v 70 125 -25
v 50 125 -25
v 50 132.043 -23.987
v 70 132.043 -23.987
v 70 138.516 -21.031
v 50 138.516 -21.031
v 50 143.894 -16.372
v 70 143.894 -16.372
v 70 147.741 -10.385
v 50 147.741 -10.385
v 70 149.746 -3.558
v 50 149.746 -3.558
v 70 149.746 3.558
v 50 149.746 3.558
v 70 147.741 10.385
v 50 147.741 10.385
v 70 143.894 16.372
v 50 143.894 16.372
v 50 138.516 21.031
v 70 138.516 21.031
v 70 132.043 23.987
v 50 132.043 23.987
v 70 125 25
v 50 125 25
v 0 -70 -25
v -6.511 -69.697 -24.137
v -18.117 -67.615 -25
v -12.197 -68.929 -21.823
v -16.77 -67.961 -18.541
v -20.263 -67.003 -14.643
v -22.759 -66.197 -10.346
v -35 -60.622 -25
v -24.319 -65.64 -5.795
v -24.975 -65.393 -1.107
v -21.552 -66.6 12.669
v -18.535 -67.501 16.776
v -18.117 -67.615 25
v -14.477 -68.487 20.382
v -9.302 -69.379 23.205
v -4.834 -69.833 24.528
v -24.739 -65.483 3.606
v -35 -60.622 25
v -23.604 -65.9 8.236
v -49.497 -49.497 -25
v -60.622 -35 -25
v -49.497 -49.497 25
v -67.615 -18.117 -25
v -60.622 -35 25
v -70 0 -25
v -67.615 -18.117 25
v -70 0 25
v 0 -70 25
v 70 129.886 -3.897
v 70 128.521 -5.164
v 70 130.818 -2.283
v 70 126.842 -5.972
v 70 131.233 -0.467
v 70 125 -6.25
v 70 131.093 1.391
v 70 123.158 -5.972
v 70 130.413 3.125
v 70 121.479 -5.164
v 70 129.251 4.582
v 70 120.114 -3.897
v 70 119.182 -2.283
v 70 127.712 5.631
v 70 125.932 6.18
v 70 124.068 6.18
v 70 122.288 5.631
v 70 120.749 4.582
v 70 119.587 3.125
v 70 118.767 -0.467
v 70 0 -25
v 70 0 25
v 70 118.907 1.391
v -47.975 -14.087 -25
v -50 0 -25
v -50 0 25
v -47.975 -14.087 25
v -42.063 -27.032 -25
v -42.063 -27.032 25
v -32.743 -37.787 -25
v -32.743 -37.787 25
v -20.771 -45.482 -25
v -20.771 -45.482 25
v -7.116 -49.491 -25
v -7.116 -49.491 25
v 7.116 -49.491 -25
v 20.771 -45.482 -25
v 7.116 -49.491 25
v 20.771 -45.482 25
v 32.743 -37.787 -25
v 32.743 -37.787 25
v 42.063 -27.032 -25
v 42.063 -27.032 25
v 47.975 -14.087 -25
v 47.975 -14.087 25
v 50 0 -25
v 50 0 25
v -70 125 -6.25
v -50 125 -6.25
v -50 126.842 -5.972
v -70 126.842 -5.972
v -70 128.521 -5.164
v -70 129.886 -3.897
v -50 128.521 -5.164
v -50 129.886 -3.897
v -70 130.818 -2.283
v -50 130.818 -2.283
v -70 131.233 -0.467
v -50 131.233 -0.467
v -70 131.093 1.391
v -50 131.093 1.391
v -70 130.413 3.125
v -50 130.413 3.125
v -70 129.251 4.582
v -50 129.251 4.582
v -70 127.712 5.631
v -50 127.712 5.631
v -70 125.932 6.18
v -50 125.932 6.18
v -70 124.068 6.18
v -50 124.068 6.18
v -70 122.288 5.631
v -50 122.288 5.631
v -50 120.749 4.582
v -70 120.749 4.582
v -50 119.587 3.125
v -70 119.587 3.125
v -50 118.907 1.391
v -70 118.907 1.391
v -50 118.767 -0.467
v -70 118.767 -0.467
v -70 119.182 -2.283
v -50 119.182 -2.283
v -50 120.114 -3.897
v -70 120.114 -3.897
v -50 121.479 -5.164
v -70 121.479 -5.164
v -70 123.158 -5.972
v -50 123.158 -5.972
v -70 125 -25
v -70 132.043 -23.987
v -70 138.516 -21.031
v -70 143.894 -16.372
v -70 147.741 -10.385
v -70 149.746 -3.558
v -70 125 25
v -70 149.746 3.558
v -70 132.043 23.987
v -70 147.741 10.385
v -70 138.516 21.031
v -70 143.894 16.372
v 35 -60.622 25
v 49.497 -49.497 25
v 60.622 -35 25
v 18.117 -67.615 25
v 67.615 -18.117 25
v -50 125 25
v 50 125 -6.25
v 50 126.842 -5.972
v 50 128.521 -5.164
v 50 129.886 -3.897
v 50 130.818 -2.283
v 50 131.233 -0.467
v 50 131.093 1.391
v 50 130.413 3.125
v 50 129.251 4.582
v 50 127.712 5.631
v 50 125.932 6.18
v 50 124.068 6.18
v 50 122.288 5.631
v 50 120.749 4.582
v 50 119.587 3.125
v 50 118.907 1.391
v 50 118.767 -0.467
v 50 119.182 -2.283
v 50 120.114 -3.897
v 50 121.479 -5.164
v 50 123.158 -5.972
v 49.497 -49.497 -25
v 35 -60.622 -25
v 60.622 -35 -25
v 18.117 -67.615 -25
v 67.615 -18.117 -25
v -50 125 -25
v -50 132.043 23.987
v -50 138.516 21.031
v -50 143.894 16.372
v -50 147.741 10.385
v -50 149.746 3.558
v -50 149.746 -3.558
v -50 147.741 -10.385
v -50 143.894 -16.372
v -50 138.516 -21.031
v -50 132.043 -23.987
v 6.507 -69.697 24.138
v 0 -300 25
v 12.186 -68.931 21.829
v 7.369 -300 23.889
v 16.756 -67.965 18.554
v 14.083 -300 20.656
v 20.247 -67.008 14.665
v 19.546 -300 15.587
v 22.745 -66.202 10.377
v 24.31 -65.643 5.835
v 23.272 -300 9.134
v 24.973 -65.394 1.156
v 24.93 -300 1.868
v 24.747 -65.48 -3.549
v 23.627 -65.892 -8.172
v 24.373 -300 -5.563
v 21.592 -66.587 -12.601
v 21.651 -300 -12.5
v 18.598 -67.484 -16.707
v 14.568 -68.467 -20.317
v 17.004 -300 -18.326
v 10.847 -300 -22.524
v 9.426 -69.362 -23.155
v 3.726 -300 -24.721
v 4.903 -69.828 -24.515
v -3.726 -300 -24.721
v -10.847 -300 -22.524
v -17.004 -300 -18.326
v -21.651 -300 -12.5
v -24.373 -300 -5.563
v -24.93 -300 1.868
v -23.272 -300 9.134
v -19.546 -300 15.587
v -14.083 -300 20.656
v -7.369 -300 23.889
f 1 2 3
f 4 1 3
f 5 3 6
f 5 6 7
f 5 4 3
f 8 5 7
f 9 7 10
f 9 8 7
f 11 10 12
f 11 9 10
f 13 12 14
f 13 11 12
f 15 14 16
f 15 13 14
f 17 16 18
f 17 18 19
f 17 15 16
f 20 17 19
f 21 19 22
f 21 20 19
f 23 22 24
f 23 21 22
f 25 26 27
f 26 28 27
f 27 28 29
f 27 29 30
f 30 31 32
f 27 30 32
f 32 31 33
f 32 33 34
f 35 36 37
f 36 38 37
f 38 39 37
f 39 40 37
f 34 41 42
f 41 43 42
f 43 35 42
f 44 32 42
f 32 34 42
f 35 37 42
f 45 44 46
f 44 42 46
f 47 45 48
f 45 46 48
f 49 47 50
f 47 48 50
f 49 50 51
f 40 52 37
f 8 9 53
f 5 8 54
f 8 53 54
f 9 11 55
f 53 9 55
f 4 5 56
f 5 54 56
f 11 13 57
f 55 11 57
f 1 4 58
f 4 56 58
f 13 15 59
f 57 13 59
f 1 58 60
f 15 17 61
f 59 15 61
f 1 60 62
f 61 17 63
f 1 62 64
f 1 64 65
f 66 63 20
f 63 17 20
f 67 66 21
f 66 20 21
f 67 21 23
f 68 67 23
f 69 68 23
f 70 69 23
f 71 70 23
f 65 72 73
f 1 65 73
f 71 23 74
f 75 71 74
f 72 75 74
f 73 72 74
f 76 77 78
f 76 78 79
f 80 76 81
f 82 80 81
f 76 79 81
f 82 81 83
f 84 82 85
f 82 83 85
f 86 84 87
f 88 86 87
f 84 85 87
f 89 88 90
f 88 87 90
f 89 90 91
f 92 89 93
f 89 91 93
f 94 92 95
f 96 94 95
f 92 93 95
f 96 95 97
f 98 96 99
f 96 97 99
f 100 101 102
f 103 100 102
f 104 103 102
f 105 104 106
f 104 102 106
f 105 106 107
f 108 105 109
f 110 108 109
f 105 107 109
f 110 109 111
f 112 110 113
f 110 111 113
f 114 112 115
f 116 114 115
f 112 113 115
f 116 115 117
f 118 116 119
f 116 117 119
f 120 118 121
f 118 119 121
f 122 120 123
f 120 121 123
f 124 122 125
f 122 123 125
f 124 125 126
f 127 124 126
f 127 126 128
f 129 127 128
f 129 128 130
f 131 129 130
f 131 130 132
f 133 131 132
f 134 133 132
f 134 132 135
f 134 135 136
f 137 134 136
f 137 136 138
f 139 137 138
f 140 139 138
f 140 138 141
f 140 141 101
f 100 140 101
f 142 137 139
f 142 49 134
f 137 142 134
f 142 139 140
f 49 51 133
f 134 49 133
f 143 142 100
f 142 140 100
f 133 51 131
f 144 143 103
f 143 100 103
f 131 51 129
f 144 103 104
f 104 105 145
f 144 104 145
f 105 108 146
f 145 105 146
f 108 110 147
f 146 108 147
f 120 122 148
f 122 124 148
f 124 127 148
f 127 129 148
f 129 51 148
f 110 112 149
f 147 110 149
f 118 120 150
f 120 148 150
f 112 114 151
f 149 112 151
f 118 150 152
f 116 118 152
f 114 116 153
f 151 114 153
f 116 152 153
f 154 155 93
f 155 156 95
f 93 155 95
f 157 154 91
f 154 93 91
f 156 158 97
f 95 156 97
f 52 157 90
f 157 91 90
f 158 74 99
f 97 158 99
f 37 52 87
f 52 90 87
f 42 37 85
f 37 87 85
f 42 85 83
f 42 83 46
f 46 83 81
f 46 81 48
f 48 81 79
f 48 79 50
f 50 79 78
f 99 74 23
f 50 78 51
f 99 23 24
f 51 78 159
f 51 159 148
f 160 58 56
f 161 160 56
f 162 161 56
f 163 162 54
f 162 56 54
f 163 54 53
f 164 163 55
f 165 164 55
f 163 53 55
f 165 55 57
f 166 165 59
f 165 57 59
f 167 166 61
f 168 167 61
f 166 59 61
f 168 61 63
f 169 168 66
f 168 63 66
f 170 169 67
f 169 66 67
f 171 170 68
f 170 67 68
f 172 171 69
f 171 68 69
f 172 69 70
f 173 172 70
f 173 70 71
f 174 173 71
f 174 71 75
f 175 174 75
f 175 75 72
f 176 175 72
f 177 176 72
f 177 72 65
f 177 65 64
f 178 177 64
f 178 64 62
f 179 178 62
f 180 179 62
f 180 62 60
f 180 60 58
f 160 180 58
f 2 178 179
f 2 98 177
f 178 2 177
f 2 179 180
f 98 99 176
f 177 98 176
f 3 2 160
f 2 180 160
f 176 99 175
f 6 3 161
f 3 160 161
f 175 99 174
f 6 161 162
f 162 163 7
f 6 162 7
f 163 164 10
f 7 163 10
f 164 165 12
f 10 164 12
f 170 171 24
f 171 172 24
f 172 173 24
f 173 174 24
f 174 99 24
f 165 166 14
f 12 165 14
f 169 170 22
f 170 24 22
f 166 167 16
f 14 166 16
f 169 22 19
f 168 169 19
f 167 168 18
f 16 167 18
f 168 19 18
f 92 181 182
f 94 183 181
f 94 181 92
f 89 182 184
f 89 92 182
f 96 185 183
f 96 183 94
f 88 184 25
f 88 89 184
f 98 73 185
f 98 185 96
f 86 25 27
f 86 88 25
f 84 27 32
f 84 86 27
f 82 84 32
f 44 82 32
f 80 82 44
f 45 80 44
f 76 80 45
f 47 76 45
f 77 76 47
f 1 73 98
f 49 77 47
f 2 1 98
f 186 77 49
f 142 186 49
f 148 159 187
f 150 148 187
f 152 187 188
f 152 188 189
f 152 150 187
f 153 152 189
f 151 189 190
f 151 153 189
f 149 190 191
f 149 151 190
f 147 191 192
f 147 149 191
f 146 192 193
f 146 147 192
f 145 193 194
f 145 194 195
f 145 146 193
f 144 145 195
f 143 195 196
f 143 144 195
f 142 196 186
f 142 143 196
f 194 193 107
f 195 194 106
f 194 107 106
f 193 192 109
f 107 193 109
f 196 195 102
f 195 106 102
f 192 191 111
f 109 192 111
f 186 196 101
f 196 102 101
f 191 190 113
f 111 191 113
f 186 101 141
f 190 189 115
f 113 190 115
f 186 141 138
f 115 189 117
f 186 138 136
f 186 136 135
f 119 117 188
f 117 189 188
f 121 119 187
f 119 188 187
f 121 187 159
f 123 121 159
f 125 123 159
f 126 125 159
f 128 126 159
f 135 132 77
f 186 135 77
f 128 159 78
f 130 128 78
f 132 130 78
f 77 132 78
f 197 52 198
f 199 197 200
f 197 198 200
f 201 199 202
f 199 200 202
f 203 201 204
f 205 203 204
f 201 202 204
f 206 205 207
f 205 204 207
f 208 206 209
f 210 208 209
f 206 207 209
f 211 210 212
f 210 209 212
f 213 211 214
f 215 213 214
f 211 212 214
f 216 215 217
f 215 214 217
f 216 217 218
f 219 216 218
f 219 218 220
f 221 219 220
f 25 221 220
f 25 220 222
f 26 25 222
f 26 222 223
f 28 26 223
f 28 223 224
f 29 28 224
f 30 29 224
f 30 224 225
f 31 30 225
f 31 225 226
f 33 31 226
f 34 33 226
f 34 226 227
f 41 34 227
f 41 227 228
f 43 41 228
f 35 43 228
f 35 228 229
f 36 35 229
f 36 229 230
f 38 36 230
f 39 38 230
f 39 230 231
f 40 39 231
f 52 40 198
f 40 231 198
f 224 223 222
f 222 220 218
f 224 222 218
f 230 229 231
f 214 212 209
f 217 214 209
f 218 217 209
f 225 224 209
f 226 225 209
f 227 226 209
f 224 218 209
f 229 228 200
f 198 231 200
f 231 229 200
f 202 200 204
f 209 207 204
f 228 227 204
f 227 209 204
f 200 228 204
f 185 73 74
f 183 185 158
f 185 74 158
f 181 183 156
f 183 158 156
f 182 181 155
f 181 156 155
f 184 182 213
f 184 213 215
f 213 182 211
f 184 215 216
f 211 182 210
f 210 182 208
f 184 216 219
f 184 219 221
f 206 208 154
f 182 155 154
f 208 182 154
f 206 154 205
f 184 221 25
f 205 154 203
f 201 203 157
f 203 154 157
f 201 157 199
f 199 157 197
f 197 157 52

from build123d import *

# Parameters (mm, degrees)
BOSS_EXTRU_1_DEPTH      = 25
CONG_2_RADIUS           = 25
CONG_2_LENGTH           = 20
CONG_3_RADIUS           = 25
CONG_3_LENGTH           = 20
BOSS_EXTRU_3_REACH      = 458.098
BOSS_EXTRU_3_END_RADIUS = 70
ESQUISSE6_R             = 25
ESQUISSE7_R             = 6.25
ENL_V_MAT_EXTRU_1_DEPTH = 333.001506161


with BuildPart() as part:
    # Esquisse4 → Boss.-Extru.1 (new, symmetric)
    with BuildSketch(Plane.XY):
        with BuildLine():
            Line((-70, -2.817e-06), (-70, 149.999997183))
            Line((-70, 149.999997183), (-50, 149.999997183))
            Line((-50, 149.999997183), (-50, -2.817e-06))
            ThreePointArc((-50, -2.817e-06), (0, -50), (50, -2.817e-06))
            Line((50, -2.817e-06), (50, 149.999997183))
            Line((50, 149.999997183), (70, 149.999997183))
            Line((70, 149.999997183), (70, -2.817e-06))
            ThreePointArc((70, -2.817e-06), (0, -70), (-70, -2.817e-06))
        make_face()
    extrude(amount=BOSS_EXTRU_1_DEPTH, both=True)

    # Congé2: full round fillet: the end face becomes a half cylinder, R = half its width
    cong_2_face = Plane((-60, 149.999997183, 0), x_dir=(-1, 0, 0), z_dir=(0, 1, 0))  # on the end face: x along it, z out of the body
    cong_2_slab = cong_2_face.offset(-CONG_2_RADIUS / 2) * Box(CONG_2_LENGTH, 2 * CONG_2_RADIUS, CONG_2_RADIUS, mode=Mode.PRIVATE)  # the body's end, R deep
    cong_2_round = Plane((-60, 124.999997183, 0), x_dir=(0, 1, 0), z_dir=(-1, 0, 0)) * Cylinder(CONG_2_RADIUS, CONG_2_LENGTH, mode=Mode.PRIVATE)  # its axis R under the face
    add(cong_2_slab - cong_2_round, mode=Mode.SUBTRACT)

    # Congé3: full round fillet: the end face becomes a half cylinder, R = half its width
    cong_3_face = Plane((60, 149.999997183, 0), x_dir=(1, 0, 0), z_dir=(0, 1, 0))  # on the end face: x along it, z out of the body
    cong_3_slab = cong_3_face.offset(-CONG_3_RADIUS / 2) * Box(CONG_3_LENGTH, 2 * CONG_3_RADIUS, CONG_3_RADIUS, mode=Mode.PRIVATE)  # the body's end, R deep
    cong_3_round = Plane((60, 124.999997183, 0), x_dir=(0, 1, 0), z_dir=(1, 0, 0)) * Cylinder(CONG_3_RADIUS, CONG_3_LENGTH, mode=Mode.PRIVATE)  # its axis R under the face
    add(cong_3_slab - cong_3_round, mode=Mode.SUBTRACT)

    # Boss.-Extru.3: up to this cylinder (the profile starts outside it)
    boss_extru_3_end = Plane(origin=(0, 0, 0), z_dir=(0, 0, -1)) * Cylinder(BOSS_EXTRU_3_END_RADIUS, 1057.196, mode=Mode.PRIVATE)
    # Esquisse6 → Boss.-Extru.3 (add, up to the surface)
    with BuildSketch(Plane(origin=(0, -300, 0), x_dir=(1, 0, 0), z_dir=(0, 1, 0)), mode=Mode.PRIVATE) as boss_extru_3_sk1:
        with Locations(Location((0, 0, 0), (0, 0, 270))):
            Circle(ESQUISSE6_R)
    boss_extru_3_tool1 = extrude(boss_extru_3_sk1.sketch, amount=BOSS_EXTRU_3_REACH, mode=Mode.PRIVATE) - boss_extru_3_end
    add(boss_extru_3_tool1.solids().sort_by_distance((0, -300, 0))[0])

    # Esquisse7 → Enlèv. mat.-Extru.1 (cut, through all)
    with BuildSketch(Plane(origin=(70, 0, 0), x_dir=(0, 0, -1), z_dir=(1, 0, 0))):
        with Locations((0, 124.999997183)):
            Circle(ESQUISSE7_R)
    extrude(amount=-ENL_V_MAT_EXTRU_1_DEPTH, mode=Mode.SUBTRACT)


solid = part.part
